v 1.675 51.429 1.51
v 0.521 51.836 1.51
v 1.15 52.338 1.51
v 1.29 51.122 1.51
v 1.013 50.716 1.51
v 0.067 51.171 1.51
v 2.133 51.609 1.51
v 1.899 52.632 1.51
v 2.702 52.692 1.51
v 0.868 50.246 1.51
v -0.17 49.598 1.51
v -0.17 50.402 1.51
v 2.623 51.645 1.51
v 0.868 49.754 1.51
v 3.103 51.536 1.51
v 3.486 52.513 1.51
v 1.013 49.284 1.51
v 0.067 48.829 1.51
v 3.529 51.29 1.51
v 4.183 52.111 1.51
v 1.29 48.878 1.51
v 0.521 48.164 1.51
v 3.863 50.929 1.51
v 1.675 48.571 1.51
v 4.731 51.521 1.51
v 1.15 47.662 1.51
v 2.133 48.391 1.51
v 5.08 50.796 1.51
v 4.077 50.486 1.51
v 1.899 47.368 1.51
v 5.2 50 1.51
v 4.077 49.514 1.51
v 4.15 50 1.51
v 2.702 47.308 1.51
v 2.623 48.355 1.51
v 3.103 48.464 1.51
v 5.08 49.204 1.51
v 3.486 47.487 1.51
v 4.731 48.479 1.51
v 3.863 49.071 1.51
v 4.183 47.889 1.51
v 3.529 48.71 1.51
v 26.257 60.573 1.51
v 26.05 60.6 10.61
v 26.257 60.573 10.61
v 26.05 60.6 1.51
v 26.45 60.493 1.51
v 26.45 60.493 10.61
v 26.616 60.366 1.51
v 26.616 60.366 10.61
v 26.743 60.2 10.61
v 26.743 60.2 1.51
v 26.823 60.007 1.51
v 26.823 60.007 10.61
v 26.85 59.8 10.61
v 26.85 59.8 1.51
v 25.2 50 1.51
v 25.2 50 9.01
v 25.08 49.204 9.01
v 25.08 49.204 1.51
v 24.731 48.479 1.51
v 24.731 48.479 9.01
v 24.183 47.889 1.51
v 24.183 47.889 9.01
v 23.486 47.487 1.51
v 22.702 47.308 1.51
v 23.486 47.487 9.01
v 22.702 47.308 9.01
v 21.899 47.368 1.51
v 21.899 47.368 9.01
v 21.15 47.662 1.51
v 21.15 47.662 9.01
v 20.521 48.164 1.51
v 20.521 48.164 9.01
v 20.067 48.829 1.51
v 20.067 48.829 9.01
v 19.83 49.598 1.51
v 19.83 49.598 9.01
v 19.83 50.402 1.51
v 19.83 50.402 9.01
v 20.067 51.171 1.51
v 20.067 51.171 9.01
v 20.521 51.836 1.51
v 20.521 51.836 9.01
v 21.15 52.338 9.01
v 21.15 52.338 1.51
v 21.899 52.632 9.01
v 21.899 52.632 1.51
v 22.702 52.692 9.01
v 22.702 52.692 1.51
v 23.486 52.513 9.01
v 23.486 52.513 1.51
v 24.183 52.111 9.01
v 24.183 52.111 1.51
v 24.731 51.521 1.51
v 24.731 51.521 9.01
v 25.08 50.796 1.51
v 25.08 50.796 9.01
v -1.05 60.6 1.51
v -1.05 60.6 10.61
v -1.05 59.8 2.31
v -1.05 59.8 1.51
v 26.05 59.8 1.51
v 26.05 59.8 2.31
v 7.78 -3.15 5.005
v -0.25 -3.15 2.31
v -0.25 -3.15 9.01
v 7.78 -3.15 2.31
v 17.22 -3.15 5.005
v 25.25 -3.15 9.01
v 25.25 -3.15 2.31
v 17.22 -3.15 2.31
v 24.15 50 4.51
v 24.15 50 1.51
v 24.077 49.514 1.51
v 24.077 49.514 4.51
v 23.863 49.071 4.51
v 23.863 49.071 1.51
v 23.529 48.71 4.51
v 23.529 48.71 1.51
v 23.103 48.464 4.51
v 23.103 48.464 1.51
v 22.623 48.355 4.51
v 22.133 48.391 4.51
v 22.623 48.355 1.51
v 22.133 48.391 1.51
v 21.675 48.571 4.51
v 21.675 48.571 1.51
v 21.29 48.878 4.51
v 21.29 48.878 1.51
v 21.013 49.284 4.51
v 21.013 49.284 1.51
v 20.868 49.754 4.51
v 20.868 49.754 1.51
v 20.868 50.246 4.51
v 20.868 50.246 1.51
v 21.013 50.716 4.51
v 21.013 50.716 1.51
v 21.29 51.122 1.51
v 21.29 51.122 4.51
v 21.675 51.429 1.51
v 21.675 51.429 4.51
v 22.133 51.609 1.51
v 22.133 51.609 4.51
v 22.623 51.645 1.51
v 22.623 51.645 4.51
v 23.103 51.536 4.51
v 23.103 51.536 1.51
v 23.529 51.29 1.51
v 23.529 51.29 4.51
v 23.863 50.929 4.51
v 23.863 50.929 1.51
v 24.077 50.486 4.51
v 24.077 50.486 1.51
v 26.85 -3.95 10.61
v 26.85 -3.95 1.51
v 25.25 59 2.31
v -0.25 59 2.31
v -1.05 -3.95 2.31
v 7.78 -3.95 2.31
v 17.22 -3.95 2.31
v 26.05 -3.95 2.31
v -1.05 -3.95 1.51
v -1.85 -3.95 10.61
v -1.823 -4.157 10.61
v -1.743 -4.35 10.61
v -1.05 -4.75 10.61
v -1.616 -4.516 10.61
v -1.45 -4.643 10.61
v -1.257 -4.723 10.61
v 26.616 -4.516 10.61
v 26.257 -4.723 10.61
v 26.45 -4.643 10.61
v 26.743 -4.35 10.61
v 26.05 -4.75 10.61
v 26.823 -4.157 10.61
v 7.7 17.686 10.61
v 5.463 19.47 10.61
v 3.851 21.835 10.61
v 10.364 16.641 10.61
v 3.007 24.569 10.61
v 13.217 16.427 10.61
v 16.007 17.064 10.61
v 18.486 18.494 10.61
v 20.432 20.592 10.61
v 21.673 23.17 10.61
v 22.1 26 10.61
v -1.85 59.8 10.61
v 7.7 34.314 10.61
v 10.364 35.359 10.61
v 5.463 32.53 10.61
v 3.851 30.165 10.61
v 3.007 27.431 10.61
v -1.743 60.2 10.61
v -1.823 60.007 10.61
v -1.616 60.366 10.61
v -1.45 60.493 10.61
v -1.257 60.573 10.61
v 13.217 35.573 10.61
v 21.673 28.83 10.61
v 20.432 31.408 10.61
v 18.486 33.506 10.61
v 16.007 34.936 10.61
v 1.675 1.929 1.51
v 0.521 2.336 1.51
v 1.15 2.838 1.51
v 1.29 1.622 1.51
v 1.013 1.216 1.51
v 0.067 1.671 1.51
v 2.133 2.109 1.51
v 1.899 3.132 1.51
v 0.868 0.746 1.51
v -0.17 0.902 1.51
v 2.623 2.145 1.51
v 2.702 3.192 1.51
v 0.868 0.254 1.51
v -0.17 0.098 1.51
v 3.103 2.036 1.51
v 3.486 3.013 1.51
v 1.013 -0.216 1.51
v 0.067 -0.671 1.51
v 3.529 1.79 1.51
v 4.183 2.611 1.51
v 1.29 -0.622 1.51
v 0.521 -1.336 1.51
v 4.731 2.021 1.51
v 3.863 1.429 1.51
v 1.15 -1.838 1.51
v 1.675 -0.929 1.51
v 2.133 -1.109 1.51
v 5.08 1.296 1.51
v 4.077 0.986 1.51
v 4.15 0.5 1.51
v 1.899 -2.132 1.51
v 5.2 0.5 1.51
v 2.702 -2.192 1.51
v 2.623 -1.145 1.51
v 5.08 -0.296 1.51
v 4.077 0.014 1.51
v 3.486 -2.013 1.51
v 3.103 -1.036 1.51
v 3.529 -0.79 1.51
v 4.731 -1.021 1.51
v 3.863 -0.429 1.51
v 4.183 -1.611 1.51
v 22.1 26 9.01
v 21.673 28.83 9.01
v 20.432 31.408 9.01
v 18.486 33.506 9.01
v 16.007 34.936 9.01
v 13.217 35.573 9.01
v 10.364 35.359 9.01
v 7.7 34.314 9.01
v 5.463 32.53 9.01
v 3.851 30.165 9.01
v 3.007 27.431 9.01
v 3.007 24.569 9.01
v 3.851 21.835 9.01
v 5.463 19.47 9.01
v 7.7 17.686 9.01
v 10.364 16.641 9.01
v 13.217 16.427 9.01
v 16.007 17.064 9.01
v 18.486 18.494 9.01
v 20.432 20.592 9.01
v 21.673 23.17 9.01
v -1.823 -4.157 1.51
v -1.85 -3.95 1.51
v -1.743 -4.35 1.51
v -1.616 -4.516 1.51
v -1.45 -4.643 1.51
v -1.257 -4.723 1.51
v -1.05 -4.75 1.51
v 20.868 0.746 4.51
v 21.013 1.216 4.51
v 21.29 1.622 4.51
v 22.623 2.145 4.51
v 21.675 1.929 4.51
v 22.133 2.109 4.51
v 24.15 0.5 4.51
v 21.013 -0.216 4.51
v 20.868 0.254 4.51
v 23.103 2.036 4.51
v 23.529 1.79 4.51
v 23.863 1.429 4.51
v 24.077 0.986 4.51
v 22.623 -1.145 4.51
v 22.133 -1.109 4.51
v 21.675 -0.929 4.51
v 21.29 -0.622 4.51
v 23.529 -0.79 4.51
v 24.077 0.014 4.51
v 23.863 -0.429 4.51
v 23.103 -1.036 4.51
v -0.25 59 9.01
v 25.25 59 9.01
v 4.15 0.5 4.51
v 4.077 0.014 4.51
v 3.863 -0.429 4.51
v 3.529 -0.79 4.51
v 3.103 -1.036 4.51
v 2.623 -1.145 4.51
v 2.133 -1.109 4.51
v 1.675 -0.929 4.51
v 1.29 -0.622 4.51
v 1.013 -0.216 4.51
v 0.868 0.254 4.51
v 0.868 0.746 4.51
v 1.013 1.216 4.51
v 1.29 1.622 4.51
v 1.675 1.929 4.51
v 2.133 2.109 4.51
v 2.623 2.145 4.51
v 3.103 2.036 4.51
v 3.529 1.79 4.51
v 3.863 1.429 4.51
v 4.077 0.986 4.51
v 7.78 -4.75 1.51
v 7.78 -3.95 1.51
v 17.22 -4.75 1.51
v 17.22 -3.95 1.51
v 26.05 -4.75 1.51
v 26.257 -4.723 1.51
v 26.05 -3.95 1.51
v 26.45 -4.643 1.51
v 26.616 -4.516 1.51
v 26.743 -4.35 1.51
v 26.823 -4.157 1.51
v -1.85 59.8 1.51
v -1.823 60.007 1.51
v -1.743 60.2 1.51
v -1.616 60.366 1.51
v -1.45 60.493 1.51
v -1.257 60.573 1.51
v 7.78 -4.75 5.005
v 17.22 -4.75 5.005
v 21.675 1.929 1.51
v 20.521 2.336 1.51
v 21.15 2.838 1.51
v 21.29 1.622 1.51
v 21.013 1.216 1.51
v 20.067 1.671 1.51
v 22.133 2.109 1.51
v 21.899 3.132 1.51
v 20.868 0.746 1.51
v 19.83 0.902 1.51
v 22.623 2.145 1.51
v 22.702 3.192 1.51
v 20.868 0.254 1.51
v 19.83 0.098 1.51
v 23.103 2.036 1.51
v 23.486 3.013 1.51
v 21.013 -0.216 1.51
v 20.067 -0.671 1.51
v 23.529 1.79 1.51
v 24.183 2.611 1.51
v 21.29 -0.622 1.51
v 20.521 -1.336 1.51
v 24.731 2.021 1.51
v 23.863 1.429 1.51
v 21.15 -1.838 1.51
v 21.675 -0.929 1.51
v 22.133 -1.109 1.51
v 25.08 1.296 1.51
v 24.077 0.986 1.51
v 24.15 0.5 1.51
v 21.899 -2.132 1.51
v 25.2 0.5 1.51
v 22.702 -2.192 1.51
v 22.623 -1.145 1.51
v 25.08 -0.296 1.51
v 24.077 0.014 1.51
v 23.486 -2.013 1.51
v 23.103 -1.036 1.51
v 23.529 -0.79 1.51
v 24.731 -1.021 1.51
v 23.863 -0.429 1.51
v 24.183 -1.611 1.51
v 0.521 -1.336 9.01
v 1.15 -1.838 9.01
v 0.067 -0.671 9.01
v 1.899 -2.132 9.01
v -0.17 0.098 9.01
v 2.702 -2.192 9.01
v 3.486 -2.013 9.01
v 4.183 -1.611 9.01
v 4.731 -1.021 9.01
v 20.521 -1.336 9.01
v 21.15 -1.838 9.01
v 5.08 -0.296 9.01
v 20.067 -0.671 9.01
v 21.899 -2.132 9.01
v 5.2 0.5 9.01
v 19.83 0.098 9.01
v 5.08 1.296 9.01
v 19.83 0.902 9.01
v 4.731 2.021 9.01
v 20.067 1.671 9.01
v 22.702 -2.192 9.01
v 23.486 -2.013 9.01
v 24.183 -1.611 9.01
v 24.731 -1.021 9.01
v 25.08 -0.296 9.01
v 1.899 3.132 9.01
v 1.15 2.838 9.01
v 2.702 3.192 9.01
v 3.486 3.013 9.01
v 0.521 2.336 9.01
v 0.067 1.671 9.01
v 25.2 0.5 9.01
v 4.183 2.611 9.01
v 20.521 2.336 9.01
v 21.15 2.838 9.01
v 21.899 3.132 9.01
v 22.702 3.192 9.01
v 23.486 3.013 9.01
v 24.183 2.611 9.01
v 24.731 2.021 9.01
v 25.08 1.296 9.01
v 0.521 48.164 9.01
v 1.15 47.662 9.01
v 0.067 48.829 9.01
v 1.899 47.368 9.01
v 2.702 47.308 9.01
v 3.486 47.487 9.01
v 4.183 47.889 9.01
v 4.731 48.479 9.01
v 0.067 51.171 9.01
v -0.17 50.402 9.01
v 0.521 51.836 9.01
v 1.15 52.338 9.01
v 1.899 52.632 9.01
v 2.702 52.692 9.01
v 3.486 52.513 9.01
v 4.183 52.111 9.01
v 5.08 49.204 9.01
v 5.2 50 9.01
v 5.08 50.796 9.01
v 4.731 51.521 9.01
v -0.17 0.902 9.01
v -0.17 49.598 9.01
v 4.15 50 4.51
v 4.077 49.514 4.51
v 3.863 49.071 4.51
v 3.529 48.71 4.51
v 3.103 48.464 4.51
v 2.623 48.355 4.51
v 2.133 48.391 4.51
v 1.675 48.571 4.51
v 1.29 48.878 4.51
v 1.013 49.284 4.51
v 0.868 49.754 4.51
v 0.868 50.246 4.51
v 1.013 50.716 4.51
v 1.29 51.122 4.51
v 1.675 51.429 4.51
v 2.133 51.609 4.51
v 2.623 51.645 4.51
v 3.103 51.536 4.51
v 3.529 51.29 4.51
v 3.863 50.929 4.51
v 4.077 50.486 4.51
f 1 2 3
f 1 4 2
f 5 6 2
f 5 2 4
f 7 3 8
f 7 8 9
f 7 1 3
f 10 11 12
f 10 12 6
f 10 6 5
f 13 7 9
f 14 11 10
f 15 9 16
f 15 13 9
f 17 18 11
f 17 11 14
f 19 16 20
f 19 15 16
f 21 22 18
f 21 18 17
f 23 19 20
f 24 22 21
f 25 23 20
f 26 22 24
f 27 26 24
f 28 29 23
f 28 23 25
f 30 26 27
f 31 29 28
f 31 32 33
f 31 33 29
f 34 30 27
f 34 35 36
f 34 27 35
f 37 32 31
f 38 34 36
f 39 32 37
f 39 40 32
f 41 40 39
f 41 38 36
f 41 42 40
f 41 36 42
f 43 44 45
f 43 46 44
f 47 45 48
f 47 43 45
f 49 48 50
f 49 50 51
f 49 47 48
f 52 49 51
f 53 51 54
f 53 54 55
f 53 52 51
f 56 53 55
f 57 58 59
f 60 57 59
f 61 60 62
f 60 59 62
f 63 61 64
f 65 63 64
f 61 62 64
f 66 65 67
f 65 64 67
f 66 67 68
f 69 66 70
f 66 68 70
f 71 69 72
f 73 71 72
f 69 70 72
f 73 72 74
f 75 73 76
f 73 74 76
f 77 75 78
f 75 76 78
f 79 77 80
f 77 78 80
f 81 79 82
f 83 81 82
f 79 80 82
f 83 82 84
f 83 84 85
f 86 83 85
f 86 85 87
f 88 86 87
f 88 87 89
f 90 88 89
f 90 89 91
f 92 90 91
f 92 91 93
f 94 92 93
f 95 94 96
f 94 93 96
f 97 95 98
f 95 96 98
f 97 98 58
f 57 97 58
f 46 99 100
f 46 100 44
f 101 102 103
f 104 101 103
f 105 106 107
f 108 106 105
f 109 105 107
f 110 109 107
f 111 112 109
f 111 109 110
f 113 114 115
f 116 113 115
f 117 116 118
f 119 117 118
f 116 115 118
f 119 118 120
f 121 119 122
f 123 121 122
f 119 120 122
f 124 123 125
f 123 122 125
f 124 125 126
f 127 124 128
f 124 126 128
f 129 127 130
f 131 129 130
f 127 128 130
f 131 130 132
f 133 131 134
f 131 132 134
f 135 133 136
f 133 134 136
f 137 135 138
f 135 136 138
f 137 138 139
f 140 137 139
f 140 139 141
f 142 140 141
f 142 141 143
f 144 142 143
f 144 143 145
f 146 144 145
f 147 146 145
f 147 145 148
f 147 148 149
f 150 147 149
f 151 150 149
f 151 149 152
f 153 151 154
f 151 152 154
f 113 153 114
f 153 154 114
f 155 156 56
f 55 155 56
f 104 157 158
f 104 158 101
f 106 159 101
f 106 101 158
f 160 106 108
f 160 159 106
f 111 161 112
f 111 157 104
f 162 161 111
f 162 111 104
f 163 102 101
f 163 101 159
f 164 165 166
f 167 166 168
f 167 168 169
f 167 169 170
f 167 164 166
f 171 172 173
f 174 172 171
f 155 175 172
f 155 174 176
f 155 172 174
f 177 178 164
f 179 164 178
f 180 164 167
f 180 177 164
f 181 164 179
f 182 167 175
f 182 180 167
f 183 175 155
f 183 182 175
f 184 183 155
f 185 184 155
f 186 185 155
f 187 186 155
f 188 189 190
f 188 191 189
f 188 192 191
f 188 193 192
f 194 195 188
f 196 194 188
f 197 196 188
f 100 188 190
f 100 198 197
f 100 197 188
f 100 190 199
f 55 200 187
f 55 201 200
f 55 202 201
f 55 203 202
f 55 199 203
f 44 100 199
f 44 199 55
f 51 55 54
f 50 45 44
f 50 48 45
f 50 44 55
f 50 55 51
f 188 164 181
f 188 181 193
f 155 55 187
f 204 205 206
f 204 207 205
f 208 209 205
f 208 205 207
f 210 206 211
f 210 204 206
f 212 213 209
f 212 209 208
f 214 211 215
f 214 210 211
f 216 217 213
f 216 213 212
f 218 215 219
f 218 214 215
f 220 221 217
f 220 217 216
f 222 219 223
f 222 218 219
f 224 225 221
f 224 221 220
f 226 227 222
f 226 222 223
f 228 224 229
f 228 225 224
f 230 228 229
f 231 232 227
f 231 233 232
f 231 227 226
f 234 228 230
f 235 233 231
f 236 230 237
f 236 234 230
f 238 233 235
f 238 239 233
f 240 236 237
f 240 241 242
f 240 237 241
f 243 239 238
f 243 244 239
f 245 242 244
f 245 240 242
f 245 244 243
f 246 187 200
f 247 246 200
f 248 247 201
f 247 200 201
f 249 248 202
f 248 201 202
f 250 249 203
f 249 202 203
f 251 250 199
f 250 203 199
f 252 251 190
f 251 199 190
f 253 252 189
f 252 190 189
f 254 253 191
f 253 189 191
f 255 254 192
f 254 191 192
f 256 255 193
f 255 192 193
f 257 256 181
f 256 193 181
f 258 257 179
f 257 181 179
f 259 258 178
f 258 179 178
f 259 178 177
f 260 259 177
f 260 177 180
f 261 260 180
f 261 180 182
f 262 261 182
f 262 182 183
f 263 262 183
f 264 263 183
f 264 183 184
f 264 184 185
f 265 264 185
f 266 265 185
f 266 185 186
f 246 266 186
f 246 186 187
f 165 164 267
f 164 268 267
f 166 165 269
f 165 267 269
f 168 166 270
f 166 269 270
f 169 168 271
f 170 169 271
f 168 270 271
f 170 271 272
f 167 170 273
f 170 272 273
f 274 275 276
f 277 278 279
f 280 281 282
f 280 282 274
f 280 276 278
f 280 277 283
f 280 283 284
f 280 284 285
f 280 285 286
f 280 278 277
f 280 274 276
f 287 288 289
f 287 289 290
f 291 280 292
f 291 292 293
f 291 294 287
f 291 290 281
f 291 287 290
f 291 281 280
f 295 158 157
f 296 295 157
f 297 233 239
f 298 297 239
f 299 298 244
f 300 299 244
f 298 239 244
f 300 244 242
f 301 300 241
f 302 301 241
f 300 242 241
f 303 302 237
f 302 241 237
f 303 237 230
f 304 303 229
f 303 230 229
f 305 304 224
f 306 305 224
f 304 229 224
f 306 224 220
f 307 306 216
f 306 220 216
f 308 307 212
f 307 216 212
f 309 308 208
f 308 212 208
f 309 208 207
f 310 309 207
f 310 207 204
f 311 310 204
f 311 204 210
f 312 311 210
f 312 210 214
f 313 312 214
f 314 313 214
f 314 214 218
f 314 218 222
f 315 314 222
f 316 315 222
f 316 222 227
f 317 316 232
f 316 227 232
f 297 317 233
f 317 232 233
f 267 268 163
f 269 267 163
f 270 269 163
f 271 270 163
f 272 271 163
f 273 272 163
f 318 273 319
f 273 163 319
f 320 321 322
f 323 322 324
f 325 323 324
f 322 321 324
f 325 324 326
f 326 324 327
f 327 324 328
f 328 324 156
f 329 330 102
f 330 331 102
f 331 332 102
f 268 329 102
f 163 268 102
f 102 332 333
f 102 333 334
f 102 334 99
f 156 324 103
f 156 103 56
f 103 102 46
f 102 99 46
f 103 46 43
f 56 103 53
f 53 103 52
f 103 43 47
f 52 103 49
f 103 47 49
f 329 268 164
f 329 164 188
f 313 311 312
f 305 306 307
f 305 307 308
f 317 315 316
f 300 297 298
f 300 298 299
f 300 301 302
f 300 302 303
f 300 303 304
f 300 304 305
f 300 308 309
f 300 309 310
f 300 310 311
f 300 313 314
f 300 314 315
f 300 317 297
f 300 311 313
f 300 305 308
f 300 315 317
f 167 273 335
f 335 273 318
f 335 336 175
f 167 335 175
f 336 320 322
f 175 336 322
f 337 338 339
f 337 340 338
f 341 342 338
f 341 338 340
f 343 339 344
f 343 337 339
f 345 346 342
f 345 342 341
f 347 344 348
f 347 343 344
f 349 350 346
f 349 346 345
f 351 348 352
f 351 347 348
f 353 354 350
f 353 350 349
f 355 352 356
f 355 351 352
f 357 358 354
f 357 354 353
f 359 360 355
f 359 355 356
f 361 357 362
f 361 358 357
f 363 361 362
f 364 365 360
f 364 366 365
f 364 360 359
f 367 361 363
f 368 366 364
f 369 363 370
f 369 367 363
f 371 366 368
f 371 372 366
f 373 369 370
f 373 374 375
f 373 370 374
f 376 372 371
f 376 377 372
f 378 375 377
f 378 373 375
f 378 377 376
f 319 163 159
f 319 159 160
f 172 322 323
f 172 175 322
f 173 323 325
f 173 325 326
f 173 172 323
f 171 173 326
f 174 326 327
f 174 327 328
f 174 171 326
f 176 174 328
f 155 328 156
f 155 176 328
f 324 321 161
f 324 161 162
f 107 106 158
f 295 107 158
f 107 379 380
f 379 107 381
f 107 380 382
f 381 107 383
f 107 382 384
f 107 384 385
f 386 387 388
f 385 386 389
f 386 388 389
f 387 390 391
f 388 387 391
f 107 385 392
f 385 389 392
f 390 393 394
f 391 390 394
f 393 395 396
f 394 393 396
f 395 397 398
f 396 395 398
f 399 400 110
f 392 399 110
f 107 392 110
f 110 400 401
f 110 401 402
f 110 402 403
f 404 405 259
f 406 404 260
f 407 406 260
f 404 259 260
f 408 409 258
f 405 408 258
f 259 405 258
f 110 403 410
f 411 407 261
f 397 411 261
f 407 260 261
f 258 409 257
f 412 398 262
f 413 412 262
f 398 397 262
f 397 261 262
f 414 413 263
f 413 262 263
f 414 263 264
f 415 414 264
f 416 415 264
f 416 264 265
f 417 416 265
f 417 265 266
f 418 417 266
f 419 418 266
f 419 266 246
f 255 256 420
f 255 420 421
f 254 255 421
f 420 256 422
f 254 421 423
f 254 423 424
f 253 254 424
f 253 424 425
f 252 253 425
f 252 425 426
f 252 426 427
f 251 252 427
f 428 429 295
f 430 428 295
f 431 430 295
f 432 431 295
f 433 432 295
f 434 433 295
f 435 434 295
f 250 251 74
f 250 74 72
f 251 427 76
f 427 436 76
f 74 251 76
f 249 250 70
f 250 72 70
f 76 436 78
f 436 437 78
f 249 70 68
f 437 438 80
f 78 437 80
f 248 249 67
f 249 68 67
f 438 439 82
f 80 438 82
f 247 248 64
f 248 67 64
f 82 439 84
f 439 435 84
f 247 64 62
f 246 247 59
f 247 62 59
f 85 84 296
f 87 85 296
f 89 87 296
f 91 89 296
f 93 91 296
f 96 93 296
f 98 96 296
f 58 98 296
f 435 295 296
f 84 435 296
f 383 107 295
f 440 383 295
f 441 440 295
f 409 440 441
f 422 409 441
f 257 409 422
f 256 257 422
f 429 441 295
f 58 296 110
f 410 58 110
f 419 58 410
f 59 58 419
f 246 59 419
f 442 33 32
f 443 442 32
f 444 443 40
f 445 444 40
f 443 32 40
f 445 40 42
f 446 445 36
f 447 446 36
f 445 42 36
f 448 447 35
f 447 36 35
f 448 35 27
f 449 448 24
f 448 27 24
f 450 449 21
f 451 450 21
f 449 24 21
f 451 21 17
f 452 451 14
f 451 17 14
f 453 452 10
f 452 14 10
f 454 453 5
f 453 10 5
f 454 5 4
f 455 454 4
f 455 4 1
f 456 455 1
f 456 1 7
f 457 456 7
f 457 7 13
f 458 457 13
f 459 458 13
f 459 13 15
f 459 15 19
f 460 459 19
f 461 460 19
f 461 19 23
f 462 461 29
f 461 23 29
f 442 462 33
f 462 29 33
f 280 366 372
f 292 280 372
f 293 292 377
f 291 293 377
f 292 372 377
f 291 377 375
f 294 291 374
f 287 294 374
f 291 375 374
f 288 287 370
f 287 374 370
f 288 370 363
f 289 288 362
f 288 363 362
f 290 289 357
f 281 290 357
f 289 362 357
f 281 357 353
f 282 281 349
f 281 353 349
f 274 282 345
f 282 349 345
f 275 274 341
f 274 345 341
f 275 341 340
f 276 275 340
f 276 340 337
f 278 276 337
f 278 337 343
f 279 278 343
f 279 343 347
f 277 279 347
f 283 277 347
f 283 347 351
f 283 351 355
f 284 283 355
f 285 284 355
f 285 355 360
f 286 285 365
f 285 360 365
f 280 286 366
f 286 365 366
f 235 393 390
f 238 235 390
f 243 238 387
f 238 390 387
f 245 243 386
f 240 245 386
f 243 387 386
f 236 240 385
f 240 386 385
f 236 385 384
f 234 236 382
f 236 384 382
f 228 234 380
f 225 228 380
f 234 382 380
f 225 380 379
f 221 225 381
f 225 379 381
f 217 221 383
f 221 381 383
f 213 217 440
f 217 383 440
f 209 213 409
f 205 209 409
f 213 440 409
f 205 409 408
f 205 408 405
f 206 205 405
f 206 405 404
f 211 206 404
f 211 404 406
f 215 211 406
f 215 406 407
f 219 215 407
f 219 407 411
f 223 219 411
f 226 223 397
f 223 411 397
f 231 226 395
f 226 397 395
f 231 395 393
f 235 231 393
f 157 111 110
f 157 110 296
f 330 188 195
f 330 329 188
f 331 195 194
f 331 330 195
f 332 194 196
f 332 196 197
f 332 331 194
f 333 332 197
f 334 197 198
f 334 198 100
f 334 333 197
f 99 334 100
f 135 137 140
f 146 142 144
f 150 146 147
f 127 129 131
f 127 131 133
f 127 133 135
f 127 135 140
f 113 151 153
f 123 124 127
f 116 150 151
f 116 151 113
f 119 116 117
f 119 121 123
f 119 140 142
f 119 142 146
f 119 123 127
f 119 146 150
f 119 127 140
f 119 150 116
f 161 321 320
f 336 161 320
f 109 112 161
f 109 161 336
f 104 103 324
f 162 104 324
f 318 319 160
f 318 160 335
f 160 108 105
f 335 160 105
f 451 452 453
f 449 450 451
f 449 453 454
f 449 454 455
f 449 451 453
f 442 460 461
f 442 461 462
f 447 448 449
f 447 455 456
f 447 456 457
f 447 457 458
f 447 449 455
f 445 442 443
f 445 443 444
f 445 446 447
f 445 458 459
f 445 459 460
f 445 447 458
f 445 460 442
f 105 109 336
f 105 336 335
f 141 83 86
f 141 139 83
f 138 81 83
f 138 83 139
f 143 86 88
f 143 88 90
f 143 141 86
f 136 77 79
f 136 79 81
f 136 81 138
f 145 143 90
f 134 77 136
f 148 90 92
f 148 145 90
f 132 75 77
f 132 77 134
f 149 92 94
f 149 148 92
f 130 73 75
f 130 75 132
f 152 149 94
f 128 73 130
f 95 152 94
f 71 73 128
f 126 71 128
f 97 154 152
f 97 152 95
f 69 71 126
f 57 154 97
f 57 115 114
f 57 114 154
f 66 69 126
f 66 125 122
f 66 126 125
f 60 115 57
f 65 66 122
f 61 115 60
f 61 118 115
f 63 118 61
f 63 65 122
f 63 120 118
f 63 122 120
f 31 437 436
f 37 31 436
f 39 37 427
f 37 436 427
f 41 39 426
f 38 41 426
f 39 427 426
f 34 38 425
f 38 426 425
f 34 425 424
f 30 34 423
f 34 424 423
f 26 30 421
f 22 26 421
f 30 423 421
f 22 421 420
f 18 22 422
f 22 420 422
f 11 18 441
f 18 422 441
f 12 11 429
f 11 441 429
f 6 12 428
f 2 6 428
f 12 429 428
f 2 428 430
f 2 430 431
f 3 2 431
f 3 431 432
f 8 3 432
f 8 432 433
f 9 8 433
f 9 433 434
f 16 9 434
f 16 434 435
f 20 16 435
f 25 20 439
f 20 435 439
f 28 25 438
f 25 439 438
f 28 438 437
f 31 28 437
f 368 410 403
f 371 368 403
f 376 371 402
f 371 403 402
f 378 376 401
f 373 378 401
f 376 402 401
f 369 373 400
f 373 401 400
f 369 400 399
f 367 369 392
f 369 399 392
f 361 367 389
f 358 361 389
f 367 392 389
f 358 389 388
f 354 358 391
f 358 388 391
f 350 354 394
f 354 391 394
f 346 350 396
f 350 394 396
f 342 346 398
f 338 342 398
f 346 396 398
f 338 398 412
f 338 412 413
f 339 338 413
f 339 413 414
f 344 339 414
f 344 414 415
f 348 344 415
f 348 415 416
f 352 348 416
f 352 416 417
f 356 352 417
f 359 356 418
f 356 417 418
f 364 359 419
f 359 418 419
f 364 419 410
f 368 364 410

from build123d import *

# Parameters (mm, degrees)
SKETCH007_W     = 25.5
SKETCH007_H     = 62.15
PAD004_DEPTH    = 7.5
THICKNESS001_T  = 1.6
SKETCH008_R     = 9.6
POCKET002_DEPTH = 5
SKETCH009_W     = 27.1
SKETCH009_H     = 63.75
SKETCH009_W_2   = 25.5
SKETCH009_H_2   = 62.15
POCKET003_DEPTH = 0.8
FILLET001_R     = 0.8
SKETCH010_R     = 2.7
PAD005_DEPTH    = 7.5
SKETCH011_R     = 1.65
POCKET004_DEPTH = 3
SKETCH012_W     = 9.44
SKETCH012_H     = 3.495
POCKET005_DEPTH = 5


with BuildPart() as part:
    # Sketch007 (on Face1 of Binder001) → Pad004 (new body)
    with BuildSketch(Plane.XY.offset(1.51)):
        with Locations((12.5, 27.925)):
            Rectangle(SKETCH007_W, SKETCH007_H)
    extrude(amount=PAD004_DEPTH)

    # Thickness001
    thickness001_openings = [part.faces().sort_by_distance(p)[0] for p in [
        (12.5, 27.925, 1.51),
    ]]
    offset(amount=THICKNESS001_T, openings=thickness001_openings, kind=Kind.INTERSECTION)

    # Sketch008 (on Face11 of Thickness001) → Pocket002 (cut)
    with BuildSketch(Plane.XY.offset(10.61)):
        with Locations((12.5, 26)):
            Circle(SKETCH008_R)
    extrude(amount=-POCKET002_DEPTH, mode=Mode.SUBTRACT)

    # Sketch009 (on Face4 of Pocket002) → Pocket003 (cut)
    with BuildSketch(Plane(origin=(0, 0, 1.51), x_dir=(1, 0, 0), z_dir=(0, 0, -1))):
        with Locations((12.5, -27.925)):
            Rectangle(SKETCH009_W, SKETCH009_H)
        with Locations((12.5, -27.925)):
            Rectangle(SKETCH009_W_2, SKETCH009_H_2, mode=Mode.SUBTRACT)
    extrude(amount=-POCKET003_DEPTH, mode=Mode.SUBTRACT)

    # Fillet001
    fillet001_edges = [part.edges().sort_by_distance(p)[0] for p in [
        (26.85, -4.75, 6.06),
        (26.85, 60.6, 6.06),
        (-1.85, 60.6, 6.06),
        (-1.85, -4.75, 6.06),
    ]]
    fillet(fillet001_edges, radius=FILLET001_R)

    # Sketch010 (on Face21 of Fillet001) → Pad005 (join)
    with BuildSketch(Plane(origin=(0, 0, 9.01), x_dir=(1, 0, 0), z_dir=(0, 0, -1))):
        with Locations((2.5, -0.5)):
            Circle(SKETCH010_R)
        with Locations((22.5, -0.5)):
            Circle(SKETCH010_R)
        with Locations((2.5, -50)):
            Circle(SKETCH010_R)
        with Locations((22.5, -50)):
            Circle(SKETCH010_R)
    extrude(amount=PAD005_DEPTH)

    # Sketch011 (on Face27 of Pad005) → Pocket004 (cut)
    with BuildSketch(Plane(origin=(0, 0, 1.51), x_dir=(1, 0, 0), z_dir=(0, 0, -1))):
        with Locations((2.5, -0.5)):
            Circle(SKETCH011_R)
        with Locations((22.5, -0.5)):
            Circle(SKETCH011_R)
        with Locations((2.5, -50)):
            Circle(SKETCH011_R)
        with Locations((22.5, -50)):
            Circle(SKETCH011_R)
    extrude(amount=-POCKET004_DEPTH, mode=Mode.SUBTRACT)

    # Sketch012 (on Face20 of Pocket004) → Pocket005 (cut)
    with BuildSketch(Plane(origin=(0, -3.15, 0), x_dir=(-1, 0, 0), z_dir=(0, 1, 0))):
        with Locations((-12.5, 3.2575)):
            Rectangle(SKETCH012_W, SKETCH012_H)
    extrude(amount=-POCKET005_DEPTH, mode=Mode.SUBTRACT)


solid = part.part
